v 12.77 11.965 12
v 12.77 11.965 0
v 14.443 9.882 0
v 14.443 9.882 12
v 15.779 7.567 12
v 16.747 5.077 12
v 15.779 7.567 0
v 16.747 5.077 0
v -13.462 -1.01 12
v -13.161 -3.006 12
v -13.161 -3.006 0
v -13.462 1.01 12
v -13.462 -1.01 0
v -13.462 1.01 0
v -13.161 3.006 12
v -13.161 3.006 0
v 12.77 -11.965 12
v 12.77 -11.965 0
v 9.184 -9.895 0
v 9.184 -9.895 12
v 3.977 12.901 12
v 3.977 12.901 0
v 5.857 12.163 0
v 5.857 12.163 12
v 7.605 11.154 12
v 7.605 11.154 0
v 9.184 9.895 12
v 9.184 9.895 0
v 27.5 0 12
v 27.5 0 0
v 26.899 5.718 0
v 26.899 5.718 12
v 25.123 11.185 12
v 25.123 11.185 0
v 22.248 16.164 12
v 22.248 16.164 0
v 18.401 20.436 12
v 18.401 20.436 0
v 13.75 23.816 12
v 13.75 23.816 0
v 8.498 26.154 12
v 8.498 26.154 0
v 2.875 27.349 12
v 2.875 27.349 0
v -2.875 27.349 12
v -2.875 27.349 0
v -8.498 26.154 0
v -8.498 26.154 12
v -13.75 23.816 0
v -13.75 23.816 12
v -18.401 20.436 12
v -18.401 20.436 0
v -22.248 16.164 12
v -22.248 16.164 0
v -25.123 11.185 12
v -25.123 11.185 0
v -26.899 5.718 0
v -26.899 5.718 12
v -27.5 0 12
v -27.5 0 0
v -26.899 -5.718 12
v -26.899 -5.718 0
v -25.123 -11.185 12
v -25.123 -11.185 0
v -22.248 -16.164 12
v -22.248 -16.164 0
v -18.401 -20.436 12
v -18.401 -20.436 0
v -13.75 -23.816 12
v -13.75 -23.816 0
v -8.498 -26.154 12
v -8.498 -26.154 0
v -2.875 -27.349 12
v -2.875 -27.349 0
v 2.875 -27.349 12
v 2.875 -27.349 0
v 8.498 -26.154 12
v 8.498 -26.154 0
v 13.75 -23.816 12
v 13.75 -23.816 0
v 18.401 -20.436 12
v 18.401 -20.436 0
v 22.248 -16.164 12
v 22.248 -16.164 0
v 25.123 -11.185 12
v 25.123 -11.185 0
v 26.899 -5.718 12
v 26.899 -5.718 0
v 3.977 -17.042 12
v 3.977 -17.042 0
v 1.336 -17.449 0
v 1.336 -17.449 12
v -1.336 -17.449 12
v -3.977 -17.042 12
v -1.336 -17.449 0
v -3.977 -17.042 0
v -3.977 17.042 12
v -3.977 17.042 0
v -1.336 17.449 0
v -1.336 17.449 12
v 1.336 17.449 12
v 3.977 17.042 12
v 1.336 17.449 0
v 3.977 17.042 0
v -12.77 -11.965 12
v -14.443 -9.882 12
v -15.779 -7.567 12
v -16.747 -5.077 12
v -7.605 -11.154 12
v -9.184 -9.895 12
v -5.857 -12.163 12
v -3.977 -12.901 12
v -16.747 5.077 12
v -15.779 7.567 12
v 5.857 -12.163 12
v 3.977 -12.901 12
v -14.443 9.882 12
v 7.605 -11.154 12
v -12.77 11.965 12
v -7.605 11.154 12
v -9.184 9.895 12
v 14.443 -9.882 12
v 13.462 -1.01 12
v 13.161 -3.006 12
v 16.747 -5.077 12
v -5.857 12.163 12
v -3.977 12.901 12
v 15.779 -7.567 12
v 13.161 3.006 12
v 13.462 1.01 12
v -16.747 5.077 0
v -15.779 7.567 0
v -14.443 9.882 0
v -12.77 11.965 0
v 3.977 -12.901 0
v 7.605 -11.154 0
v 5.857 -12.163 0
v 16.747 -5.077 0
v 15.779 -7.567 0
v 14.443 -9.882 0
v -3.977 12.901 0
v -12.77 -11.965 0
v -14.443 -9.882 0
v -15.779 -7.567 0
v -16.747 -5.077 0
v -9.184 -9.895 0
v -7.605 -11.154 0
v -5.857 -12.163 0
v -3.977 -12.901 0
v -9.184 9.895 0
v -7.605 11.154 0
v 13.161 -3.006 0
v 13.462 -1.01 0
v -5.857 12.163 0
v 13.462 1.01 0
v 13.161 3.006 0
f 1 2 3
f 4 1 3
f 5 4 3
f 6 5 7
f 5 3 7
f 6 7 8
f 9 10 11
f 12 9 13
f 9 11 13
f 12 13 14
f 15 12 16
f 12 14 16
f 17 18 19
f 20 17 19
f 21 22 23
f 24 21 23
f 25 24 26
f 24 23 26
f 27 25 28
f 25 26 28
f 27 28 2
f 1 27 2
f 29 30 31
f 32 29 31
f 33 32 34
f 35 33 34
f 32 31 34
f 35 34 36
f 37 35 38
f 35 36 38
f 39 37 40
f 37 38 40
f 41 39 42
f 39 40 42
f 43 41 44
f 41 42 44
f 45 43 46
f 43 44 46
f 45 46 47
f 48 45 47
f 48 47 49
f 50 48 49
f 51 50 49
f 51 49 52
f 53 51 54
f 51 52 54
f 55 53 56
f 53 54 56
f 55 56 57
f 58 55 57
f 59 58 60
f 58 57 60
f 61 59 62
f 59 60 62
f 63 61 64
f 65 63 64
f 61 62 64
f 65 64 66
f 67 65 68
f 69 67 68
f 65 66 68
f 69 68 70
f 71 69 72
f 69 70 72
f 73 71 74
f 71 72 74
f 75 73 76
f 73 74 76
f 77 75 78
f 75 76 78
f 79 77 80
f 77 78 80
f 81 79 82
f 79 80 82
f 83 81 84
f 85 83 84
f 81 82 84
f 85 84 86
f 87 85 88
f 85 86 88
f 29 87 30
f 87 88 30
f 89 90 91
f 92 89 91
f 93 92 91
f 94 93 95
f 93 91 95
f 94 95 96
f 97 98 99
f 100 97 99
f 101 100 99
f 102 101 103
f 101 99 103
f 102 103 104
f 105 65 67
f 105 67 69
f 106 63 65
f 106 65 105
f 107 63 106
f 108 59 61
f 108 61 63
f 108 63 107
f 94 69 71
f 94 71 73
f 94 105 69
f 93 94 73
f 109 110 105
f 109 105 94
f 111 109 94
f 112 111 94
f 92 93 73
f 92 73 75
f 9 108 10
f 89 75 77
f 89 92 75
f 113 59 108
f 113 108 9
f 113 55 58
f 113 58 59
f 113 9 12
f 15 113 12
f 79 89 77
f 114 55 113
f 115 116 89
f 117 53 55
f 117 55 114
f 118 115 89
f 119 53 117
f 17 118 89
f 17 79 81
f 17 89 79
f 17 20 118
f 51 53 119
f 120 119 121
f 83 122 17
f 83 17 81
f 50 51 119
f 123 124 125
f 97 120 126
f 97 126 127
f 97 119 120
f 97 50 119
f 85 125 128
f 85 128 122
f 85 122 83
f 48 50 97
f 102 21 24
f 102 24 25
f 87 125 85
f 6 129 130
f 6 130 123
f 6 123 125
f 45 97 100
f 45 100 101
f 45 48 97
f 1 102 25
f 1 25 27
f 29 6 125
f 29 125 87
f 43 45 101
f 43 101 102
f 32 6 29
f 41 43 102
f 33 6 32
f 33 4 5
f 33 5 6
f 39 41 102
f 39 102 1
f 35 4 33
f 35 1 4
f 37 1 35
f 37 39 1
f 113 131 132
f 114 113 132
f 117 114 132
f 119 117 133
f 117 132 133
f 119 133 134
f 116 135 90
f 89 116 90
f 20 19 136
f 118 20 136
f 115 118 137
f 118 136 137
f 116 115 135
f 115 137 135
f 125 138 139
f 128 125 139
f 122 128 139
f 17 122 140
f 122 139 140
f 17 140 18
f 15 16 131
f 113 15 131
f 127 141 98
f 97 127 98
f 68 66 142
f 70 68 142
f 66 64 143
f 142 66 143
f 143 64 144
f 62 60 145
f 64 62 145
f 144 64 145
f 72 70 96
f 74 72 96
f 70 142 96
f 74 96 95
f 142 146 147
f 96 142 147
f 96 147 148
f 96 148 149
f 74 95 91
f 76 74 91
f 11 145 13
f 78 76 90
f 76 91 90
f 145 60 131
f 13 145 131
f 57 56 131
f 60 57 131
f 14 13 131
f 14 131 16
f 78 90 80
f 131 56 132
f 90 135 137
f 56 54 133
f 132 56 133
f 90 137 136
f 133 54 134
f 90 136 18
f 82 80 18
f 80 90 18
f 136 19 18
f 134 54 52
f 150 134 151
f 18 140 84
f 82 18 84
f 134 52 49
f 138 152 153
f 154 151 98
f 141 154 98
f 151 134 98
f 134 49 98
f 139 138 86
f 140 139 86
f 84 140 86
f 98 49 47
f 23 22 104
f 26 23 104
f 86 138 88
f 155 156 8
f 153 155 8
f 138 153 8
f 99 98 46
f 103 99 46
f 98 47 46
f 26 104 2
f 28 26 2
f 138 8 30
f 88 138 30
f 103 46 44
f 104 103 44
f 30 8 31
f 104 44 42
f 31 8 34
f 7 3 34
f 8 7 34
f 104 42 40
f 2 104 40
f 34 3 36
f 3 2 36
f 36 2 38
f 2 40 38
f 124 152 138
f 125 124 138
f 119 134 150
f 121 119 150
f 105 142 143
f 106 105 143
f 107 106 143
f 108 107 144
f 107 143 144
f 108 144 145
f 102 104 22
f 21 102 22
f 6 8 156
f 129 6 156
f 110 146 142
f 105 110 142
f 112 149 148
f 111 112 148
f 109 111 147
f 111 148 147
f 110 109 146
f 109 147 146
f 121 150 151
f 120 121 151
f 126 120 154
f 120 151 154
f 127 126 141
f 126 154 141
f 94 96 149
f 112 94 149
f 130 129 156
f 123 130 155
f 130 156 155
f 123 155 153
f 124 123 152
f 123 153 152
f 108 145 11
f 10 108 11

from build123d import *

# Parameters (mm, degrees)
SKETCH1_R           = 27.5
BOSS_EXTRUDE1_DEPTH = 12


with BuildPart() as part:
    # Sketch1 → Boss-Extrude1 (new body)
    with BuildSketch(Plane.XY):
        Circle(SKETCH1_R)
        with BuildLine():
            Line((-3.977272727, 12.900825619), (-3.977272727, 17.042045114))
            ThreePointArc((-3.977272727, 17.042045114), (0, 17.5), (3.977272727, 17.042045114))
            Line((3.977272727, 17.042045114), (3.977272727, 12.900825619))
            ThreePointArc((3.977272727, 12.900825619), (6.75, 11.691342951), (9.183806352, 9.894832029))
            Line((9.183806352, 9.894832029), (12.770207637, 11.965441776))
            ThreePointArc((12.770207637, 11.965441776), (15.155444566, 8.75), (16.747480364, 5.076603337))
            Line((16.747480364, 5.076603337), (13.16107908, 3.00599359))
            ThreePointArc((13.16107908, 3.00599359), (13.5, 0), (13.16107908, -3.00599359))
            Line((13.16107908, -3.00599359), (16.747480364, -5.076603337))
            ThreePointArc((16.747480364, -5.076603337), (15.155444566, -8.75), (12.770207637, -11.965441776))
            Line((12.770207637, -11.965441776), (9.183806352, -9.894832029))
            ThreePointArc((9.183806352, -9.894832029), (6.75, -11.691342951), (3.977272727, -12.900825619))
            Line((3.977272727, -12.900825619), (3.977272727, -17.042045114))
            ThreePointArc((3.977272727, -17.042045114), (0, -17.5), (-3.977272727, -17.042045114))
            Line((-3.977272727, -17.042045114), (-3.977272727, -12.900825619))
            ThreePointArc((-3.977272727, -12.900825619), (-6.75, -11.691342951), (-9.183806352, -9.894832029))
            Line((-9.183806352, -9.894832029), (-12.770207637, -11.965441776))
            ThreePointArc((-12.770207637, -11.965441776), (-15.155444566, -8.75), (-16.747480364, -5.076603337))
            Line((-16.747480364, -5.076603337), (-13.16107908, -3.00599359))
            ThreePointArc((-13.16107908, -3.00599359), (-13.5, 0), (-13.16107908, 3.00599359))
            Line((-13.16107908, 3.00599359), (-16.747480364, 5.076603337))
            ThreePointArc((-16.747480364, 5.076603337), (-15.155444566, 8.75), (-12.770207637, 11.965441776))
            Line((-12.770207637, 11.965441776), (-9.183806352, 9.894832029))
            ThreePointArc((-9.183806352, 9.894832029), (-6.75, 11.691342951), (-3.977272727, 12.900825619))
        make_face(mode=Mode.SUBTRACT)
    extrude(amount=BOSS_EXTRUDE1_DEPTH)


solid = part.part
